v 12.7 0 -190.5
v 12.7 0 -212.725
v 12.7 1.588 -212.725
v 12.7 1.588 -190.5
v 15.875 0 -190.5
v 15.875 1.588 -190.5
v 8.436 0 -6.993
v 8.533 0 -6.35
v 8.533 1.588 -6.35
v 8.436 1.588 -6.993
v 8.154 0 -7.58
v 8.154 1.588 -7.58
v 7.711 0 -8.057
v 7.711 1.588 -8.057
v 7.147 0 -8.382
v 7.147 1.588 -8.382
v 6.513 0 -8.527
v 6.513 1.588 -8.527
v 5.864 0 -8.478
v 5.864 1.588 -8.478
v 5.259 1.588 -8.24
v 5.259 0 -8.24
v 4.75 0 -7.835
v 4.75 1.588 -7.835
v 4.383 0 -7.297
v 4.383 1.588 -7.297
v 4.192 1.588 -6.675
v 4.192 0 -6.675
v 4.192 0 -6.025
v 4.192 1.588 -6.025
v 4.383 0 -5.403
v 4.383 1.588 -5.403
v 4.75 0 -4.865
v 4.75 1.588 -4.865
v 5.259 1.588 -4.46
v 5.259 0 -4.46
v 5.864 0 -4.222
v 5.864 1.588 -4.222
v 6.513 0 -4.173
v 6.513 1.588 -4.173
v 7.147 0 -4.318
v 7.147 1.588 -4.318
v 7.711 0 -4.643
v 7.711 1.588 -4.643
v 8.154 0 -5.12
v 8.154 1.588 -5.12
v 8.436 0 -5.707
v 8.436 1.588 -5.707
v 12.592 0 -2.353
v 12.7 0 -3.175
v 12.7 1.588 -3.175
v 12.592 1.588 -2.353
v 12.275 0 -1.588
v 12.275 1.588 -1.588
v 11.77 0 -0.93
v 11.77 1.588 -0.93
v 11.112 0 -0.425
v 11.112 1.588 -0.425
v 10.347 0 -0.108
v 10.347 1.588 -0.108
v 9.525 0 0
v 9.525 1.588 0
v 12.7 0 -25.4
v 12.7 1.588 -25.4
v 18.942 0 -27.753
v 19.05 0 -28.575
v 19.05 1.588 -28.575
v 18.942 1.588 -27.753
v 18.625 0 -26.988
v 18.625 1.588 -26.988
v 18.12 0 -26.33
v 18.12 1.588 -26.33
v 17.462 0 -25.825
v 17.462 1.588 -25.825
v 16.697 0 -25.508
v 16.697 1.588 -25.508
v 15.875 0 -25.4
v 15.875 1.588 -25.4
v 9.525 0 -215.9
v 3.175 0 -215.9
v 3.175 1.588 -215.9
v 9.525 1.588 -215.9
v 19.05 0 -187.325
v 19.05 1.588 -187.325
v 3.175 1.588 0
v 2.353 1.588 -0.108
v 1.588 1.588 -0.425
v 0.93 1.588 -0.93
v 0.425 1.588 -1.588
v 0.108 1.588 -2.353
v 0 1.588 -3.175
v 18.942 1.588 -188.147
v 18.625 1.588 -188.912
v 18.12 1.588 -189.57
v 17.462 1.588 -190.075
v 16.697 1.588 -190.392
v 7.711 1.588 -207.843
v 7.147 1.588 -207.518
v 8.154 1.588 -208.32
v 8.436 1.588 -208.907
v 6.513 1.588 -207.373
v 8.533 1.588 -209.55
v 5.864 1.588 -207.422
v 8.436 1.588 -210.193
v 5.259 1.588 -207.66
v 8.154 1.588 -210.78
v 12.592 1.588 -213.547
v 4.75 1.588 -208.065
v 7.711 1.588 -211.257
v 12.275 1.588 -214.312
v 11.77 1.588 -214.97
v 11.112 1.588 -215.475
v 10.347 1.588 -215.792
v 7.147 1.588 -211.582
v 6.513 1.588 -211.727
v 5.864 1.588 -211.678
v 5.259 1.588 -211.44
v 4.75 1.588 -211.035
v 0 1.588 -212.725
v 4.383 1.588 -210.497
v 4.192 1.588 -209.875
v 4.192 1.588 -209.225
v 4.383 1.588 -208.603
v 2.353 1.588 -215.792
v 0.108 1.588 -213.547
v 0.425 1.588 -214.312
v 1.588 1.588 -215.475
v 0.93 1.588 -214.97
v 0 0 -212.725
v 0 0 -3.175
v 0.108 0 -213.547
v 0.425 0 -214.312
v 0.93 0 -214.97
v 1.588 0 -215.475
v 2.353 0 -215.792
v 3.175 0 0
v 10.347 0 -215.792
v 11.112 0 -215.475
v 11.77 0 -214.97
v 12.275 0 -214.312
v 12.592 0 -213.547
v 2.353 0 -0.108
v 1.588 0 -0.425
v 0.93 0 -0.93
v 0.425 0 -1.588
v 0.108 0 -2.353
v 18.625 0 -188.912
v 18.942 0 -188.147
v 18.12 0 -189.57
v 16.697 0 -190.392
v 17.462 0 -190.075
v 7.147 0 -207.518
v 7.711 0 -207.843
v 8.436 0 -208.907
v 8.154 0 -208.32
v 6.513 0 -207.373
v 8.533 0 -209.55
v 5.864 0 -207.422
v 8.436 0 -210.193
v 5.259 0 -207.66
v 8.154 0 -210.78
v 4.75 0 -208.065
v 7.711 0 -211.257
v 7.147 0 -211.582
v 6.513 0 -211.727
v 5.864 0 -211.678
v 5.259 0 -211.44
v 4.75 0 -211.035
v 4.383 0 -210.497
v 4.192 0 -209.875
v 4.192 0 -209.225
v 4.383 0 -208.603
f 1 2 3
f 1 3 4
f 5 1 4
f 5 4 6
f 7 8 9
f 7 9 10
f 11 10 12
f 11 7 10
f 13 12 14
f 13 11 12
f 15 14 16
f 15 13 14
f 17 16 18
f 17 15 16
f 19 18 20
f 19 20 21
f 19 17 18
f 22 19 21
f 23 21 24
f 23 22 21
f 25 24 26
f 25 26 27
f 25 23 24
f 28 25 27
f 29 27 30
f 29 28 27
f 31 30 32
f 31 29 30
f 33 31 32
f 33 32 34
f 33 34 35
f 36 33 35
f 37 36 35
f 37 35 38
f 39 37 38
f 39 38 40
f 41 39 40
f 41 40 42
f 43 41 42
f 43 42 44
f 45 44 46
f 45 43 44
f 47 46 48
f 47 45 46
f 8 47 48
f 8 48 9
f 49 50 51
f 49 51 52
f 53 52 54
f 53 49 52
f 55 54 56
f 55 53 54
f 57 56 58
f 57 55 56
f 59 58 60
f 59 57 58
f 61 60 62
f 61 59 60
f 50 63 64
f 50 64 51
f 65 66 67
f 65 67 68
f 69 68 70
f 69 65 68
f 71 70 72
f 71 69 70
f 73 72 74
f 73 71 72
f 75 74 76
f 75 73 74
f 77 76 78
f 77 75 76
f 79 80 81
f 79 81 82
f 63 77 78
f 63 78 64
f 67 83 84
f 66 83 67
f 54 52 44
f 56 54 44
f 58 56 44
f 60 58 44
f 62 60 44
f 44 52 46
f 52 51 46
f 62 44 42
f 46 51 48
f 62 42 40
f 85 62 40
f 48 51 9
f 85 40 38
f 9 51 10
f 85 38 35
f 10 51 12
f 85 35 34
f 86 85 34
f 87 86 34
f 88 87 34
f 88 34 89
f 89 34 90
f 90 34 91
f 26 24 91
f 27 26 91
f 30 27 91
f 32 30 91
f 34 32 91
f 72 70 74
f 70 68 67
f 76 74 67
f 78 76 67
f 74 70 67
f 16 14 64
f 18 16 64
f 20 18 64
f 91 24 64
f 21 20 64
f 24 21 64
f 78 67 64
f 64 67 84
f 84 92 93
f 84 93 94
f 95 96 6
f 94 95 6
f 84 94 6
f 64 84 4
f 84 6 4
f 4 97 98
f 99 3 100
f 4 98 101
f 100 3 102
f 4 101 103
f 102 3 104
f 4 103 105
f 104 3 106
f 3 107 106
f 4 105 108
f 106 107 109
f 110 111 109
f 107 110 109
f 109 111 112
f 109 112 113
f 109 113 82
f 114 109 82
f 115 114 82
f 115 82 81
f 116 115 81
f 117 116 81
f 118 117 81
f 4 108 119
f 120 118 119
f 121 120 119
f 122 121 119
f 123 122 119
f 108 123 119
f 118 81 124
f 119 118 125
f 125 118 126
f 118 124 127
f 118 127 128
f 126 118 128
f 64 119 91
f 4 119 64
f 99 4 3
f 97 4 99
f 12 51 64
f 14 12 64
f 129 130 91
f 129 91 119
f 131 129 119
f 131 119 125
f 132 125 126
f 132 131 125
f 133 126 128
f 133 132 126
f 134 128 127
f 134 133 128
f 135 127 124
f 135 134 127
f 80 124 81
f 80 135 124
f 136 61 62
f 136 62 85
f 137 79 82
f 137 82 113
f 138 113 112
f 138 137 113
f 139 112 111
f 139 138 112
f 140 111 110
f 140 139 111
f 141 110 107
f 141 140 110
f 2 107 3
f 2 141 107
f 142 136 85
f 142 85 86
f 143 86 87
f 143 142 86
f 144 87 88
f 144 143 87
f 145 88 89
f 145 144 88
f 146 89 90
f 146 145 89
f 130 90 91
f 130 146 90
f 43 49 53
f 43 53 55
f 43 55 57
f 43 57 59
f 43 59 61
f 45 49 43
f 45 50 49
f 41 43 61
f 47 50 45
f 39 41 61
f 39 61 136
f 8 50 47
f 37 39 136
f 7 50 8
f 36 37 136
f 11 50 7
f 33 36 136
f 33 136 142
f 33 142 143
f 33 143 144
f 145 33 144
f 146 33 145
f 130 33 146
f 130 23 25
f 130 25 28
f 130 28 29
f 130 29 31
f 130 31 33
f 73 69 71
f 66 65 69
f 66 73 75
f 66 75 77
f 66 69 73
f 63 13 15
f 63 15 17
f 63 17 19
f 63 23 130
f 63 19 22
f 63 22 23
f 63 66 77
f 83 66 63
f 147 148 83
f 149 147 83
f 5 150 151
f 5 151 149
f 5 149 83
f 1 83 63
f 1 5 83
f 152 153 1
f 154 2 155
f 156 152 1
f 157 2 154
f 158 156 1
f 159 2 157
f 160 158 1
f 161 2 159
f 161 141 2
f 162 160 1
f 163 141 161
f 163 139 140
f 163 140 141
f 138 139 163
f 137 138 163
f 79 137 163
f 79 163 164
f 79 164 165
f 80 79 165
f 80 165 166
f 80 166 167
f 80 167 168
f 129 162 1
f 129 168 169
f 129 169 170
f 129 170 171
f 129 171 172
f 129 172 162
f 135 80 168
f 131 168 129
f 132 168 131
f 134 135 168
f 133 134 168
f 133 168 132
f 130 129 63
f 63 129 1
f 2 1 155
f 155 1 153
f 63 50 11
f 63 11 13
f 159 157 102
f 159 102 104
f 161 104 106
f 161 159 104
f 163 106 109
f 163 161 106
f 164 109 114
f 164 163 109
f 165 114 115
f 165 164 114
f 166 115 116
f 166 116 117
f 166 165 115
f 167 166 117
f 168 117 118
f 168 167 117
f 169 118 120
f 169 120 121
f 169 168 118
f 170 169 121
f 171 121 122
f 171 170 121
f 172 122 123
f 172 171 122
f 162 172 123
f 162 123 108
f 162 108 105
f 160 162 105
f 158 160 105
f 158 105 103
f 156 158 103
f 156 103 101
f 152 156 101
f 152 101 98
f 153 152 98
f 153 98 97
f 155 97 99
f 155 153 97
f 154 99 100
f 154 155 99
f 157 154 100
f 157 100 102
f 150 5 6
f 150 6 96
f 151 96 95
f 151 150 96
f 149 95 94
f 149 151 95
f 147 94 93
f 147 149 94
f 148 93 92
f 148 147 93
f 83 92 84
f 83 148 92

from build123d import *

# Parameters (mm, degrees)
SKETCH1_R           = 2.1828125
BOSS_EXTRUDE1_DEPTH = 1.5875


with BuildPart() as part:
    # Sketch1 → Boss-Extrude1 (new body)
    with BuildSketch(Plane(origin=(0, 0, 0), x_dir=(1, 0, 0), z_dir=(0, 1, 0))):
        with BuildLine():
            Line((0, 3.175), (0, 212.725))
            ThreePointArc((0, 212.725), (0.92993597, 214.97006403), (3.175, 215.9))
            Line((3.175, 215.9), (9.525, 215.9))
            ThreePointArc((9.525, 215.9), (11.77006403, 214.97006403), (12.7, 212.725))
            Line((12.7, 212.725), (12.7, 190.5))
            Line((12.7, 190.5), (15.875, 190.5))
            ThreePointArc((15.875, 190.5), (18.12006403, 189.57006403), (19.05, 187.325))
            Line((19.05, 187.325), (19.05, 28.575))
            ThreePointArc((19.05, 28.575), (18.12006403, 26.32993597), (15.875, 25.4))
            Line((15.875, 25.4), (12.7, 25.4))
            Line((12.7, 25.4), (12.7, 3.175))
            ThreePointArc((12.7, 3.175), (11.77006403, 0.92993597), (9.525, 0))
            Line((9.525, 0), (3.175, 0))
            ThreePointArc((3.175, 0), (0.92993597, 0.92993597), (0, 3.175))
        make_face()
        with Locations((6.35, 209.55)):
            Circle(SKETCH1_R, mode=Mode.SUBTRACT)
        with Locations((6.35, 6.35)):
            Circle(SKETCH1_R, mode=Mode.SUBTRACT)
    extrude(amount=BOSS_EXTRUDE1_DEPTH)


solid = part.part
